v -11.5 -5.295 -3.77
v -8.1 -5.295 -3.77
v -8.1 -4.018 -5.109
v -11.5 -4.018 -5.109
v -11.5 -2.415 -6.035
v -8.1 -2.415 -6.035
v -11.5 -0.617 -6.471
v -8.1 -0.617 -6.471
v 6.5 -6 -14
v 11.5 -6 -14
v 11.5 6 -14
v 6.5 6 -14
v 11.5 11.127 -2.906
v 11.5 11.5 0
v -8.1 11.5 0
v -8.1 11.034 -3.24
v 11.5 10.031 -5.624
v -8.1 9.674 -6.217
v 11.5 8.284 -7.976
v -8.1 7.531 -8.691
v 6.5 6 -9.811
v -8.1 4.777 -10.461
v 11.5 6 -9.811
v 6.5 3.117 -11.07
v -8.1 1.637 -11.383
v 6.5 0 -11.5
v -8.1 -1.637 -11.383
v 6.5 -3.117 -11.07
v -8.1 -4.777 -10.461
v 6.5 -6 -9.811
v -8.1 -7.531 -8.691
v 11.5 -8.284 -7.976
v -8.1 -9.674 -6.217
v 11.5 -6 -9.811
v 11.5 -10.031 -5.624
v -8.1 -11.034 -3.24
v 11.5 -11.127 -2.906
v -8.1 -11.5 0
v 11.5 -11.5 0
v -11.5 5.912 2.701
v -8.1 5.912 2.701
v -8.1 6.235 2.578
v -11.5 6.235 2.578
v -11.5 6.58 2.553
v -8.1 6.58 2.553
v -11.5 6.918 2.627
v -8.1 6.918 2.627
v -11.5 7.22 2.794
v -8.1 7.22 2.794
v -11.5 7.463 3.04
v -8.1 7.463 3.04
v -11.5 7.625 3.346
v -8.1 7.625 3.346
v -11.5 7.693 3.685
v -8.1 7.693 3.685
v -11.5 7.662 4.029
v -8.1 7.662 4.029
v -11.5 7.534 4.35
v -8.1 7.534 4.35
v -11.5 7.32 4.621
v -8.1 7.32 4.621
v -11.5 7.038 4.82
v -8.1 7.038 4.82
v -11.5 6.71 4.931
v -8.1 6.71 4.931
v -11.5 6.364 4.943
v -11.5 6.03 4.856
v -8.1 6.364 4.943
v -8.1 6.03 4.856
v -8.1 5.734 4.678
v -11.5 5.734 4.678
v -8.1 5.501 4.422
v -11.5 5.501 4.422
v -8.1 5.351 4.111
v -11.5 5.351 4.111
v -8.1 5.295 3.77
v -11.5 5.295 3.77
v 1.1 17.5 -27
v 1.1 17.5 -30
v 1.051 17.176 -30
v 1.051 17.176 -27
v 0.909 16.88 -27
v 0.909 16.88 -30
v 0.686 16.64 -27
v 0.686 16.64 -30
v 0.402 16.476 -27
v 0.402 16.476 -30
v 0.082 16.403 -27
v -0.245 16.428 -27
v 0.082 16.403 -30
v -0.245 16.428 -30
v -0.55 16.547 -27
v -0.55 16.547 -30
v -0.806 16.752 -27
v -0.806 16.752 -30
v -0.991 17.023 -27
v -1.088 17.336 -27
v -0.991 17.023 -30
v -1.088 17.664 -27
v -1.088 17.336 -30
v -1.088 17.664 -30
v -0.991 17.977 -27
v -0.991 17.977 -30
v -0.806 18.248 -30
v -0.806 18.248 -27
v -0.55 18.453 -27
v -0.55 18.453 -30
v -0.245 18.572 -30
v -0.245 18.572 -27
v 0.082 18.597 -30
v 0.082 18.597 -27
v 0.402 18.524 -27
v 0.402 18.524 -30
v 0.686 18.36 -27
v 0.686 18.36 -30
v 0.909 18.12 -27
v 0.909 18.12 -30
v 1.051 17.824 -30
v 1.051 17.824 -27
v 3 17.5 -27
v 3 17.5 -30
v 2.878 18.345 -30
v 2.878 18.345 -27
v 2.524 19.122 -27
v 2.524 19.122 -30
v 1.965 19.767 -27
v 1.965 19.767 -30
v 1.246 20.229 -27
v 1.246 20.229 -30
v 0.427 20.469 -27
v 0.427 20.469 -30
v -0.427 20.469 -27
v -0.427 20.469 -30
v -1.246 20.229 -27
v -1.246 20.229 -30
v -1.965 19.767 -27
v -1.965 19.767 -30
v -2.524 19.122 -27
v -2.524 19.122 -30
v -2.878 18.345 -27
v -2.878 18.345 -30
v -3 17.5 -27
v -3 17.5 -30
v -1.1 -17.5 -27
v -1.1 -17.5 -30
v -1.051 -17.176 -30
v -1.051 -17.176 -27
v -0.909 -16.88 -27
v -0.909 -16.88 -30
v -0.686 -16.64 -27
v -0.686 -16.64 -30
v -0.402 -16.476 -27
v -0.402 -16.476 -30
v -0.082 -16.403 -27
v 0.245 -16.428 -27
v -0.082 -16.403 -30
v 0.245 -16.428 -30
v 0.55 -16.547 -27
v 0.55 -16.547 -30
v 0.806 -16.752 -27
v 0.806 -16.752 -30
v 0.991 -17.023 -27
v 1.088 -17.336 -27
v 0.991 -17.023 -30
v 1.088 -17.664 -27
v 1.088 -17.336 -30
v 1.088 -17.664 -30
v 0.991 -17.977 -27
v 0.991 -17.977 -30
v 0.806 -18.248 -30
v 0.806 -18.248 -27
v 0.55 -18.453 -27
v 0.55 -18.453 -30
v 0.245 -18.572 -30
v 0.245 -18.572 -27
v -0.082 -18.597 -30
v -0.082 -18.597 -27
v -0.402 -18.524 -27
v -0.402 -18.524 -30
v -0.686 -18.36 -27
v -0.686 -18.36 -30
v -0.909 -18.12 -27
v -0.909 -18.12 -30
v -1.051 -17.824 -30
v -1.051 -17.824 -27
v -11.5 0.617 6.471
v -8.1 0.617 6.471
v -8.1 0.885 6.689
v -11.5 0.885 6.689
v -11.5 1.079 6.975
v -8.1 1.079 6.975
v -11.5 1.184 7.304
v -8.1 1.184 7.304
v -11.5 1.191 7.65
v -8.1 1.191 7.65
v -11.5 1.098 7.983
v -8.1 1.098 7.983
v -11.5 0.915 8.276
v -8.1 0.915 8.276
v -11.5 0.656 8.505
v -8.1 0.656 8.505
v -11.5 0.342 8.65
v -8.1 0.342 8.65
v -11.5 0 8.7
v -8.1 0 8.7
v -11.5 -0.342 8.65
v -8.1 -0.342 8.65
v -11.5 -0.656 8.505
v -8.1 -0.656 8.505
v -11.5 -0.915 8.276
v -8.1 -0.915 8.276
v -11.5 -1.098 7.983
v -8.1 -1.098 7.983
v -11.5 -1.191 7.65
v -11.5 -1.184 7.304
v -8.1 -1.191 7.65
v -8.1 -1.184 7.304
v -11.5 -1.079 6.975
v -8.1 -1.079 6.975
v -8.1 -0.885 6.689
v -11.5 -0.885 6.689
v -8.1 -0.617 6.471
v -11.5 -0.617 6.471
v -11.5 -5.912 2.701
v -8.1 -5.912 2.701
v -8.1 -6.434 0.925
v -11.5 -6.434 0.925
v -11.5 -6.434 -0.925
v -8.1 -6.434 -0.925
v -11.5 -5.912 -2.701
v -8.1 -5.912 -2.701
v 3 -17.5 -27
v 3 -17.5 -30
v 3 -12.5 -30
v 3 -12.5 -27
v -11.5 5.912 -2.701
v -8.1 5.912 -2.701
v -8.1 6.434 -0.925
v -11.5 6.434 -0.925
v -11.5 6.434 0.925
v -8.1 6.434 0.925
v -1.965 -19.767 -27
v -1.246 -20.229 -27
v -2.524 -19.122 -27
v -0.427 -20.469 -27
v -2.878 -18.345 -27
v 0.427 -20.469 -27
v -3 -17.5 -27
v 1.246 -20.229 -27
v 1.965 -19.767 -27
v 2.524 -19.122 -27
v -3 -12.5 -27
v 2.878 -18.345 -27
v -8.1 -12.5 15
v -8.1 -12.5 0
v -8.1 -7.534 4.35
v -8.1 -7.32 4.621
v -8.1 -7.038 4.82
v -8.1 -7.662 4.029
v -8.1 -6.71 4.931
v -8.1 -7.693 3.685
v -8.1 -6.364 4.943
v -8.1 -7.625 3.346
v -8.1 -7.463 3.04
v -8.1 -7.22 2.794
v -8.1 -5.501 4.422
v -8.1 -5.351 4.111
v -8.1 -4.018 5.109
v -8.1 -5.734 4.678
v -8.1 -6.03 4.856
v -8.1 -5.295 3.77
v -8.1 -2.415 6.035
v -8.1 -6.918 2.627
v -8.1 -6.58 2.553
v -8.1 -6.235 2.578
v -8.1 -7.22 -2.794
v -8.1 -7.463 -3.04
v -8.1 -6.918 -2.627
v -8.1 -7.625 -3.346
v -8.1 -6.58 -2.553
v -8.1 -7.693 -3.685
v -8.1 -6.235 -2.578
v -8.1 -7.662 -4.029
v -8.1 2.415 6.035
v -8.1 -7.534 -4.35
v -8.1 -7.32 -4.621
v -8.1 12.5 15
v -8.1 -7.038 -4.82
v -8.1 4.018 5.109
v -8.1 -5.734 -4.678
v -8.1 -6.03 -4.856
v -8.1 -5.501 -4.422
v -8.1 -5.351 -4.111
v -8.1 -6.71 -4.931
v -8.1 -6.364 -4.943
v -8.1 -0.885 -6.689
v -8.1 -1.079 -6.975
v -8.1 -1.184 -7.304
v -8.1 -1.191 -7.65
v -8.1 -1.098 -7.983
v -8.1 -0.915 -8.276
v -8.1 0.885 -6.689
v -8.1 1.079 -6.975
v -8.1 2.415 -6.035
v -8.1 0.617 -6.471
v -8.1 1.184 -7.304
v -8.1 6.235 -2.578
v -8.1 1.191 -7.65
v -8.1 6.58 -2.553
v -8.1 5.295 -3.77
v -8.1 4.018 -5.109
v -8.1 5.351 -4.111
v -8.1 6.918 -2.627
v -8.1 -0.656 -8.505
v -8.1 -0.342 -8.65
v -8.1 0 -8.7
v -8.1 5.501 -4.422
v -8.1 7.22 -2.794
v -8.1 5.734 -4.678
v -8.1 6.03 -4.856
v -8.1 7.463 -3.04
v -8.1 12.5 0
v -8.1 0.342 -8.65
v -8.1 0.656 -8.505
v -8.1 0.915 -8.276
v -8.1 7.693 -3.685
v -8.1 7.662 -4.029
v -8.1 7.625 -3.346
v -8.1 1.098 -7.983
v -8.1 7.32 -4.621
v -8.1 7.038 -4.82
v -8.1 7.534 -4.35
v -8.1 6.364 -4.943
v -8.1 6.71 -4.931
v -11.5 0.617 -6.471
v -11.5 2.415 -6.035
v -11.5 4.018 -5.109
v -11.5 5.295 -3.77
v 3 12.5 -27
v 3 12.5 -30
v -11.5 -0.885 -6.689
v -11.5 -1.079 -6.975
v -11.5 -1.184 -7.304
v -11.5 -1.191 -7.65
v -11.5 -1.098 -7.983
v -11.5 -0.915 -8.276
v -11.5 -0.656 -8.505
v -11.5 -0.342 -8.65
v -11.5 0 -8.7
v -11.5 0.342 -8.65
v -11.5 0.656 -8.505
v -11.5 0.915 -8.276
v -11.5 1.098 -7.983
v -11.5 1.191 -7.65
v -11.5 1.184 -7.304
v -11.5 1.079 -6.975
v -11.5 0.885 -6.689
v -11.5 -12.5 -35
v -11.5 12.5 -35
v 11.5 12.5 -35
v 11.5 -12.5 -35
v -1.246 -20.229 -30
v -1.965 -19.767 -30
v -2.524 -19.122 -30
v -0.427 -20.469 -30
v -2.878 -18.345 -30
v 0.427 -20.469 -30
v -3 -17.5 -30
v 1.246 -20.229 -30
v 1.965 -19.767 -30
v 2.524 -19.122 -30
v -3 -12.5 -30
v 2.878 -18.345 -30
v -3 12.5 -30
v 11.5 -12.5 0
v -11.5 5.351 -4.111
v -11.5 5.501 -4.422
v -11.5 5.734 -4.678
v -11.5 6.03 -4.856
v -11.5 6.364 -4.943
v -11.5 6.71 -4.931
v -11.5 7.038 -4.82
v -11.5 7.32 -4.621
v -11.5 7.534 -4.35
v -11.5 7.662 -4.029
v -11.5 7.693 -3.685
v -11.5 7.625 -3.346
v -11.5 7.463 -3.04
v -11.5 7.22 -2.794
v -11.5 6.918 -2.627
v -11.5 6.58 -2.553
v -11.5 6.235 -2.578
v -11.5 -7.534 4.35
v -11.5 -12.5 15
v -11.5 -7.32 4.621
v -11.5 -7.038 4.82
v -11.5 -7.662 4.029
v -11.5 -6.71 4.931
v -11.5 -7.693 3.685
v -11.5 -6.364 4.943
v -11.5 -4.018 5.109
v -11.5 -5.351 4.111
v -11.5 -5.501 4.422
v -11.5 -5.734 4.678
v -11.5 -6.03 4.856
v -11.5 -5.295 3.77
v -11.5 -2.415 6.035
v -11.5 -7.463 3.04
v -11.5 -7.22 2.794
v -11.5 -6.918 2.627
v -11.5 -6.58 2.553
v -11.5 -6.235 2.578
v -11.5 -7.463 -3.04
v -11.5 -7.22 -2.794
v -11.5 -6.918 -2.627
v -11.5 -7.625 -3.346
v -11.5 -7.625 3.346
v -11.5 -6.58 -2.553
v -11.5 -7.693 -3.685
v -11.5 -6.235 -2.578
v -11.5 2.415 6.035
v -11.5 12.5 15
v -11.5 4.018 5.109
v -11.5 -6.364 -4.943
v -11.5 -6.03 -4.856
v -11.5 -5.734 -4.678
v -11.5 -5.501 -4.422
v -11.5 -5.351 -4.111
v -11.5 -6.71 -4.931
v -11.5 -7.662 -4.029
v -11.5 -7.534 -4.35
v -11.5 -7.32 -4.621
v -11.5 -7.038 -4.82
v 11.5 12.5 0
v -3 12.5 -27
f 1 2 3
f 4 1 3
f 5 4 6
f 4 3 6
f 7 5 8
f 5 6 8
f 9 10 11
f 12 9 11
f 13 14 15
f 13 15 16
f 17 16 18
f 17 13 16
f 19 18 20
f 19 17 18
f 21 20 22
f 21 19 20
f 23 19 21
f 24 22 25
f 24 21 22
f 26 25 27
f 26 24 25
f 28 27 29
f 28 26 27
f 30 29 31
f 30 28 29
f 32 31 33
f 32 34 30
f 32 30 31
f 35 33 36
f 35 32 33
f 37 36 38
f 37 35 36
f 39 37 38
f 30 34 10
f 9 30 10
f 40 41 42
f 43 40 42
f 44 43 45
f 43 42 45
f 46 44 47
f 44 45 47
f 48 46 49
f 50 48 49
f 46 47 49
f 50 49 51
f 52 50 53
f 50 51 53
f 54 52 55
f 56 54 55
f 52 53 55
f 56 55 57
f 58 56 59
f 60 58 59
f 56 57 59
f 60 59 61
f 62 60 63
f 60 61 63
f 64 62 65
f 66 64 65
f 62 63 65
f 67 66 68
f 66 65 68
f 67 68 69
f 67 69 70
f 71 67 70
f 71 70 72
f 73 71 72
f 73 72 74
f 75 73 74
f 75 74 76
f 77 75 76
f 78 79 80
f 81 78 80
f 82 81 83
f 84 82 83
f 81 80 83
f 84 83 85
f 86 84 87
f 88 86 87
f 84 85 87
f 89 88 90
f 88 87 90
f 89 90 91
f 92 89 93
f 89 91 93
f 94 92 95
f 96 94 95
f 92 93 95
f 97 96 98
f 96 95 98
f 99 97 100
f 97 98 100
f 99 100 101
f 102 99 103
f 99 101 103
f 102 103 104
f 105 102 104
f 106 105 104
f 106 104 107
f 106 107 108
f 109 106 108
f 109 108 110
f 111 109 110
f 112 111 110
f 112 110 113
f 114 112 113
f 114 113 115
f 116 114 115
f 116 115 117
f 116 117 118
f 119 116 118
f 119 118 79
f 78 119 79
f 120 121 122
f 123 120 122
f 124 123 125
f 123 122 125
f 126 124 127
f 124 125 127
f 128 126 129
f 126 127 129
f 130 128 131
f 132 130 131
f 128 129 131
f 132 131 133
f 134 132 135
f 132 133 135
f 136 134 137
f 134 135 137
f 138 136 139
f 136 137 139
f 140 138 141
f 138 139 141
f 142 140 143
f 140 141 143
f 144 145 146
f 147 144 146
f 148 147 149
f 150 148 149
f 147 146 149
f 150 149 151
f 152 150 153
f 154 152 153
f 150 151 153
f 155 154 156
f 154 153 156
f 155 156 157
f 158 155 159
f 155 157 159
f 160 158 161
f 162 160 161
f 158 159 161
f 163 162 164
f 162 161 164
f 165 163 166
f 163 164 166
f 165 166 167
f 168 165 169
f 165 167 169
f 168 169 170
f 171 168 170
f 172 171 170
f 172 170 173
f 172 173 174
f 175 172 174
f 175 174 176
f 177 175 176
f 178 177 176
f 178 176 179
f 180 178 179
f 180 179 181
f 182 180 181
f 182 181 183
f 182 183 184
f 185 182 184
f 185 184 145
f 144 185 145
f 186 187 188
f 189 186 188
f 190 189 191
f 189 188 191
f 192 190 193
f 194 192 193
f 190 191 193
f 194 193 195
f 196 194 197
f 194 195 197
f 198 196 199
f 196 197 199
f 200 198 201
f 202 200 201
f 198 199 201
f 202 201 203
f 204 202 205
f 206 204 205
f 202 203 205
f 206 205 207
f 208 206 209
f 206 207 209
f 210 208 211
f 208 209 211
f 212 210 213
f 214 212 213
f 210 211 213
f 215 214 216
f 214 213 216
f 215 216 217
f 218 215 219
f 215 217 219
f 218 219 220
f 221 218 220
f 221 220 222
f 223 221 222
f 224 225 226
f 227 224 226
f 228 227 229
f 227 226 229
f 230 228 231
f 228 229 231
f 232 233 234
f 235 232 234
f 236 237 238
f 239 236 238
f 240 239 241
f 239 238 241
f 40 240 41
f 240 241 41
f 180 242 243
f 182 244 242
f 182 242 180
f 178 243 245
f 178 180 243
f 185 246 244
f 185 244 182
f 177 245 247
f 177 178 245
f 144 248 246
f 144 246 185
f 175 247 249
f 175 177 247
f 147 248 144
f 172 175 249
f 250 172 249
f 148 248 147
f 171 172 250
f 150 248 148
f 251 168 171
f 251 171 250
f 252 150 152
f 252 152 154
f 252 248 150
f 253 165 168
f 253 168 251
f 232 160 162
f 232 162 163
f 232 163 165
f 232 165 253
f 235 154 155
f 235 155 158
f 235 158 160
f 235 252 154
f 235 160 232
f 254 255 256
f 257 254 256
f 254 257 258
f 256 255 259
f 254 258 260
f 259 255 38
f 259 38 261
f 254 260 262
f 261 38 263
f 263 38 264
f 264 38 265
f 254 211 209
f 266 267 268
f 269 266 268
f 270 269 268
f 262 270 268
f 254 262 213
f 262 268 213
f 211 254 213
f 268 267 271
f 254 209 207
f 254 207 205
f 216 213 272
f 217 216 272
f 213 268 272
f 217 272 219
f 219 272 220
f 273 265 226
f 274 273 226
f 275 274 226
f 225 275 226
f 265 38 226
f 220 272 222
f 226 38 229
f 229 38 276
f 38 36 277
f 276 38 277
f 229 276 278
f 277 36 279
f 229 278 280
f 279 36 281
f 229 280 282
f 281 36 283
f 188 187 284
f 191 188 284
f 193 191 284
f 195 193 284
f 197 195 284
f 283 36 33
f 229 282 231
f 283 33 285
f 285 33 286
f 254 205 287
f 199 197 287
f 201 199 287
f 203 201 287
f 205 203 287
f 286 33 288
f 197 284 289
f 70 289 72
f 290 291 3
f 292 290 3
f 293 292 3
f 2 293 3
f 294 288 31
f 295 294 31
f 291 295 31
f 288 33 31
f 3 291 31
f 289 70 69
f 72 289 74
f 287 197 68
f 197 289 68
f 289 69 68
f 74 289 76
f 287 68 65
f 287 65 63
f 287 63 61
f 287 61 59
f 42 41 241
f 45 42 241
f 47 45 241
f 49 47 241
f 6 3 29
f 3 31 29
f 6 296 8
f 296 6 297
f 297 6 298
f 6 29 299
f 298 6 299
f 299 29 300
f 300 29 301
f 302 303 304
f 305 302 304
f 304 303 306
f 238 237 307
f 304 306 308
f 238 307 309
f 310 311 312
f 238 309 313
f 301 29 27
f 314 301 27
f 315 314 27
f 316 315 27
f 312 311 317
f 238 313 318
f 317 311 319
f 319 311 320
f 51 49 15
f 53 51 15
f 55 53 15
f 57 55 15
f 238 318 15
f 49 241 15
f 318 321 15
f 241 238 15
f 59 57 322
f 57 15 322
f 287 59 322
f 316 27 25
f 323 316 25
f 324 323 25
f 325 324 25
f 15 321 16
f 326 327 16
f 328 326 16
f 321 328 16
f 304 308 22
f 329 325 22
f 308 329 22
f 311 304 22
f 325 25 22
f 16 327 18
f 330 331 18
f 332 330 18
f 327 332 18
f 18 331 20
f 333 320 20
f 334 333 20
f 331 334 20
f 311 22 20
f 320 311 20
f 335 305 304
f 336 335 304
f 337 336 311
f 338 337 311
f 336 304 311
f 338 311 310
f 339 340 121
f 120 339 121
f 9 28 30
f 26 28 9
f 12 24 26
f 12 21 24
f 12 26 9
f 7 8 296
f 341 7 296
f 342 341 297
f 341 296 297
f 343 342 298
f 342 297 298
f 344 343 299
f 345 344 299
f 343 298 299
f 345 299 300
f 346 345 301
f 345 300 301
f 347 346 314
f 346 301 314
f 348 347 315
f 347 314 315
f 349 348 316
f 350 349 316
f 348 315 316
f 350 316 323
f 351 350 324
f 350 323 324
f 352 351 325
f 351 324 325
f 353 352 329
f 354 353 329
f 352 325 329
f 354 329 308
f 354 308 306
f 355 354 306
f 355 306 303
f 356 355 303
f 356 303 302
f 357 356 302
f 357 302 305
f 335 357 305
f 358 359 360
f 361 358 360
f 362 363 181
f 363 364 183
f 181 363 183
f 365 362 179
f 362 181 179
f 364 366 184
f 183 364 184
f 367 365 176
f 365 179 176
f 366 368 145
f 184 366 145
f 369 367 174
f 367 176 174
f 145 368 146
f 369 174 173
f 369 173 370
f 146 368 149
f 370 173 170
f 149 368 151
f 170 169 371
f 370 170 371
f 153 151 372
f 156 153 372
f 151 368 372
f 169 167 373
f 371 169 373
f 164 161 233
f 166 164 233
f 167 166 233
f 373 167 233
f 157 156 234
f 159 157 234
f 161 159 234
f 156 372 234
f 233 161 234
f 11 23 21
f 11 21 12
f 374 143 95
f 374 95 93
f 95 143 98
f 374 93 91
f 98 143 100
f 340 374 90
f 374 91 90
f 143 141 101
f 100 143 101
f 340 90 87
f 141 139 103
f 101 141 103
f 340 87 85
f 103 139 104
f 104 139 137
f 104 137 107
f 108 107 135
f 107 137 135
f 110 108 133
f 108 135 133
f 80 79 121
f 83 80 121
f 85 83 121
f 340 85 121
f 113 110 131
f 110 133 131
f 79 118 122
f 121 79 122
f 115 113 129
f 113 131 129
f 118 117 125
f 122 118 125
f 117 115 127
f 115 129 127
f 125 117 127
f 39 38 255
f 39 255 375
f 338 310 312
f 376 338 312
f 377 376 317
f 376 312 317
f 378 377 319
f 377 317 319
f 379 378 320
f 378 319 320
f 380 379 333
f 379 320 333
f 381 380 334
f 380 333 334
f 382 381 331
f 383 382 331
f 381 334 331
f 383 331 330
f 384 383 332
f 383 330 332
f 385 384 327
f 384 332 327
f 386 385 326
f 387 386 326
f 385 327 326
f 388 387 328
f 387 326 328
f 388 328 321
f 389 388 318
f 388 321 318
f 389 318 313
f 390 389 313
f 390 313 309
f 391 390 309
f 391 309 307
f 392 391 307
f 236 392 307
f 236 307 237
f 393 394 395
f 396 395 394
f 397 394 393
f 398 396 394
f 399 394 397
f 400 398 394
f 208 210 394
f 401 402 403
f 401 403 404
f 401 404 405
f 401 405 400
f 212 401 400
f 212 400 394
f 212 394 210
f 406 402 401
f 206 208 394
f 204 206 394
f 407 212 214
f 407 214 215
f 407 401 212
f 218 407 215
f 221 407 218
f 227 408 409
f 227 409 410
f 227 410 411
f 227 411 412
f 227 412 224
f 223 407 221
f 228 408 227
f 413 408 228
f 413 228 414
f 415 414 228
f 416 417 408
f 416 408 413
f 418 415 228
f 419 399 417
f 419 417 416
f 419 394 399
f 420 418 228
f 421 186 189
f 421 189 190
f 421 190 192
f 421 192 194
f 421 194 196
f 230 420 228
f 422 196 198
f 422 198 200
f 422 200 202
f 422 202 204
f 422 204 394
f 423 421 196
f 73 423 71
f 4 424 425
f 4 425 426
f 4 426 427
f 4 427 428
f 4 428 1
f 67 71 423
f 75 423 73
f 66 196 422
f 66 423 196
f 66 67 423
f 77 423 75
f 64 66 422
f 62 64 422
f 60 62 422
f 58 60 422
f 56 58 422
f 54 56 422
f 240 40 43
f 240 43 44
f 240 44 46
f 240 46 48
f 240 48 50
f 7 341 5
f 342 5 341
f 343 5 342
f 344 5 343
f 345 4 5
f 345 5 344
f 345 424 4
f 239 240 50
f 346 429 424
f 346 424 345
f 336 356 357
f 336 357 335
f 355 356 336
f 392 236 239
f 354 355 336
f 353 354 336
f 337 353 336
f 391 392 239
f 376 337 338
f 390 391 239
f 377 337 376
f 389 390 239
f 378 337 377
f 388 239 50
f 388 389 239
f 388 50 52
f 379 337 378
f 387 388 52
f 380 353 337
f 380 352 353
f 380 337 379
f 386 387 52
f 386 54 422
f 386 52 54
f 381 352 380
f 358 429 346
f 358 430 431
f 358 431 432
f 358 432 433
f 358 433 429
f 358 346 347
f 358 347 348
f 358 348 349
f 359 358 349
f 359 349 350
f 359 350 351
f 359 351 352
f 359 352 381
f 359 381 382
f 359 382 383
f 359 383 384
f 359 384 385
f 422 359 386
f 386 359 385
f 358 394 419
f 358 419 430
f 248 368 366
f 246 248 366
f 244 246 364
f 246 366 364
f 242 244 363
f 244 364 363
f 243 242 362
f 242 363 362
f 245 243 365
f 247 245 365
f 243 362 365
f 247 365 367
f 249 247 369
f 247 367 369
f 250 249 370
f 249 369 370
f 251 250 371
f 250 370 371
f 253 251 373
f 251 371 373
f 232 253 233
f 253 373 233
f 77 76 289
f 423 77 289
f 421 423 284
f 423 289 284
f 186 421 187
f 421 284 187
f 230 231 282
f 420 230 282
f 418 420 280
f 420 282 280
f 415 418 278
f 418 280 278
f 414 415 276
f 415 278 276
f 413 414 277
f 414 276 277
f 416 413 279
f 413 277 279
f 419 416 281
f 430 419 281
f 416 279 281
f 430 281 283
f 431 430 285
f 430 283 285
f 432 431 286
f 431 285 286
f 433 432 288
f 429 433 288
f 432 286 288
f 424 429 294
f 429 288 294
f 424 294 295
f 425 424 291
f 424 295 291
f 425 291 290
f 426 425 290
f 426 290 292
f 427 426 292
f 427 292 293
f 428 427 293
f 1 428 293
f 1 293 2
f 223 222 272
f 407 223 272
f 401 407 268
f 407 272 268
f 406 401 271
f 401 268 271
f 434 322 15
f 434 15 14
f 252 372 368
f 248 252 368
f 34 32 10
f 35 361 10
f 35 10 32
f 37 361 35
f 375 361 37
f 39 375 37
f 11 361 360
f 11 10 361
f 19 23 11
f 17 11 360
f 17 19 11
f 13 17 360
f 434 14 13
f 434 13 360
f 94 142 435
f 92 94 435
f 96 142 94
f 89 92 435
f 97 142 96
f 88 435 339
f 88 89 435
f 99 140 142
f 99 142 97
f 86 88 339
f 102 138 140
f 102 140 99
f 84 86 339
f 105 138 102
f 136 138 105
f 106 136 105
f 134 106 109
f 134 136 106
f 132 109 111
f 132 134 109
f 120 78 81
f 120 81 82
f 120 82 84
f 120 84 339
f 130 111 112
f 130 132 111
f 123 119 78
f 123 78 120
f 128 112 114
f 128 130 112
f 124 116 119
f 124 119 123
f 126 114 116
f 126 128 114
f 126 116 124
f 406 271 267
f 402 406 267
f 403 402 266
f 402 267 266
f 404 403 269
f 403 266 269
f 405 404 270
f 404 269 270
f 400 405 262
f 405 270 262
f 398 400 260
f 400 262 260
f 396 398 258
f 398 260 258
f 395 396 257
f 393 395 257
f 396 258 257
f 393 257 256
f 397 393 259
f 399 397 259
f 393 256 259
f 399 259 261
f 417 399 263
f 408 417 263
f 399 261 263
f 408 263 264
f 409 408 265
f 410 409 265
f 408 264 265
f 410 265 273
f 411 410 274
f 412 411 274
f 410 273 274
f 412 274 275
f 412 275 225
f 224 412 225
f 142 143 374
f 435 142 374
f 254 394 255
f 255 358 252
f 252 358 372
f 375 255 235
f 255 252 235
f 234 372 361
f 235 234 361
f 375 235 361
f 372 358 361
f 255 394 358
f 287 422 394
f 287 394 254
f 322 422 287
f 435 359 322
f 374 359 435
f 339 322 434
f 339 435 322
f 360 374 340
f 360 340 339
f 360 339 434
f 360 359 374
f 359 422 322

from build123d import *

# Parameters (mm, degrees)
SKETCH_1_W          = 23
SKETCH_1_H          = 25
EXTRUDE_1_DEPTH     = 35
SKETCH_2_W          = 19.6
SKETCH_2_H          = 11.5
SKETCH_4_W          = 3.4
SKETCH_4_H          = 25
EXTRUDE_2_DEPTH     = 15
CUT_EXTRUDE_1_DEPTH = 4
SKETCH_7_W          = 5
SKETCH_7_H          = 12
CUT_EXTRUDE_3_DEPTH = 5
SKETCH_8_R          = 1.1
EXTRUDE_3_DEPTH     = 8
SKETCH_8_2_R        = 1.1
CUT_EXTRUDE_4_DEPTH = 5


with BuildPart() as part:
    # 草图1 → 凸台-拉伸1 (new body)
    with BuildSketch(Plane.XY):
        Rectangle(SKETCH_1_W, SKETCH_1_H)
    extrude(amount=-EXTRUDE_1_DEPTH)

    # 草图2 → 切除-旋转2 (revolve, cut)
    with BuildSketch(Plane.XY):
        with Locations((1.7, -5.75)):
            Rectangle(SKETCH_2_W, SKETCH_2_H)
    revolve(axis=Axis((11.5, 0, 0), (-1, 0, 0)), mode=Mode.SUBTRACT)

    # 草图4 → 凸台-拉伸2 (add)
    with BuildSketch(Plane.XY):
        with Locations((-9.8, 0)):
            Rectangle(SKETCH_4_W, SKETCH_4_H)
    extrude(amount=EXTRUDE_2_DEPTH)

    # 草图6 → 切除-拉伸1 (cut)
    with BuildSketch(Plane(origin=(-8.1, 0, 0), x_dir=(0, 0, -1), z_dir=(1, 0, 0))):
        with BuildLine():
            ThreePointArc((6.470666667, -0.616824845), (8.7, 0), (6.470666667, 0.616824845))
            ThreePointArc((6.470666667, 0.616824845), (5.629165125, 3.25), (3.769519318, 5.29534929))
            ThreePointArc((3.769519318, 5.29534929), (4.35, 7.534421013), (2.701147348, 5.912174135))
            ThreePointArc((2.701147348, 5.912174135), (0, 6.5), (-2.701147348, 5.912174135))
            ThreePointArc((-2.701147348, 5.912174135), (-4.35, 7.534421013), (-3.769519318, 5.29534929))
            ThreePointArc((-3.769519318, 5.29534929), (-5.629165125, 3.25), (-6.470666667, 0.616824845))
            ThreePointArc((-6.470666667, 0.616824845), (-8.7, 0), (-6.470666667, -0.616824845))
            ThreePointArc((-6.470666667, -0.616824845), (-5.629165125, -3.25), (-3.769519318, -5.29534929))
            ThreePointArc((-3.769519318, -5.29534929), (-4.35, -7.534421013), (-2.701147348, -5.912174135))
            ThreePointArc((-2.701147348, -5.912174135), (0, -6.5), (2.701147348, -5.912174135))
            ThreePointArc((2.701147348, -5.912174135), (4.35, -7.534421013), (3.769519318, -5.29534929))
            ThreePointArc((3.769519318, -5.29534929), (5.629165125, -3.25), (6.470666667, -0.616824845))
        make_face()
    extrude(amount=-CUT_EXTRUDE_1_DEPTH, mode=Mode.SUBTRACT)

    # 草图7 → 切除-拉伸3 (cut)
    with BuildSketch(Plane(origin=(11.5, 0, 0), x_dir=(0, 0, -1), z_dir=(1, 0, 0))):
        with Locations((11.5, 0)):
            Rectangle(SKETCH_7_W, SKETCH_7_H)
    extrude(amount=-CUT_EXTRUDE_3_DEPTH, mode=Mode.SUBTRACT)

    # 草图8 → 凸台-拉伸3 (add)
    # profile 1 of 2: a face of its own
    with BuildSketch(Plane(origin=(0, 0, -35), x_dir=(-1, 0, 0), z_dir=(0, 0, -1))):
        with BuildLine():
            Line((3, 17.5), (3, 12.5))
            Line((3, 12.5), (-3, 12.5))
            Line((-3, 12.5), (-3, 17.5))
            ThreePointArc((-3, 17.5), (0, 20.5), (3, 17.5))
        make_face()
        with Locations((0, 17.5)):
            Circle(SKETCH_8_R, mode=Mode.SUBTRACT)
    # profile 2 of 2: a face of its own
    with BuildSketch(Plane(origin=(0, 0, -35), x_dir=(-1, 0, 0), z_dir=(0, 0, -1))):
        with BuildLine():
            Line((-3, -17.5), (-3, -12.5))
            Line((-3, -12.5), (3, -12.5))
            Line((3, -12.5), (3, -17.5))
            ThreePointArc((3, -17.5), (0, -20.5), (-3, -17.5))
        make_face()
        with Locations((0, -17.5)):
            Circle(SKETCH_8_R, mode=Mode.SUBTRACT)
    extrude(amount=-EXTRUDE_3_DEPTH)

    # 草图8<2> → 切除-拉伸4 (cut)
    # profile 1 of 2: a face of its own
    with BuildSketch(Plane(origin=(0, 0, -35), x_dir=(-1, 0, 0), z_dir=(0, 0, -1))):
        with BuildLine():
            Line((3, 17.5), (3, 12.5))
            Line((3, 12.5), (-3, 12.5))
            Line((-3, 12.5), (-3, 17.5))
            ThreePointArc((-3, 17.5), (0, 20.5), (3, 17.5))
        make_face()
        with Locations((0, 17.5)):
            Circle(SKETCH_8_2_R, mode=Mode.SUBTRACT)
    # profile 2 of 2: a face of its own
    with BuildSketch(Plane(origin=(0, 0, -35), x_dir=(-1, 0, 0), z_dir=(0, 0, -1))):
        with BuildLine():
            Line((-3, -17.5), (-3, -12.5))
            Line((-3, -12.5), (3, -12.5))
            Line((3, -12.5), (3, -17.5))
            ThreePointArc((3, -17.5), (0, -20.5), (-3, -17.5))
        make_face()
        with Locations((0, -17.5)):
            Circle(SKETCH_8_2_R, mode=Mode.SUBTRACT)
    extrude(amount=-CUT_EXTRUDE_4_DEPTH, mode=Mode.SUBTRACT)


solid = part.part
